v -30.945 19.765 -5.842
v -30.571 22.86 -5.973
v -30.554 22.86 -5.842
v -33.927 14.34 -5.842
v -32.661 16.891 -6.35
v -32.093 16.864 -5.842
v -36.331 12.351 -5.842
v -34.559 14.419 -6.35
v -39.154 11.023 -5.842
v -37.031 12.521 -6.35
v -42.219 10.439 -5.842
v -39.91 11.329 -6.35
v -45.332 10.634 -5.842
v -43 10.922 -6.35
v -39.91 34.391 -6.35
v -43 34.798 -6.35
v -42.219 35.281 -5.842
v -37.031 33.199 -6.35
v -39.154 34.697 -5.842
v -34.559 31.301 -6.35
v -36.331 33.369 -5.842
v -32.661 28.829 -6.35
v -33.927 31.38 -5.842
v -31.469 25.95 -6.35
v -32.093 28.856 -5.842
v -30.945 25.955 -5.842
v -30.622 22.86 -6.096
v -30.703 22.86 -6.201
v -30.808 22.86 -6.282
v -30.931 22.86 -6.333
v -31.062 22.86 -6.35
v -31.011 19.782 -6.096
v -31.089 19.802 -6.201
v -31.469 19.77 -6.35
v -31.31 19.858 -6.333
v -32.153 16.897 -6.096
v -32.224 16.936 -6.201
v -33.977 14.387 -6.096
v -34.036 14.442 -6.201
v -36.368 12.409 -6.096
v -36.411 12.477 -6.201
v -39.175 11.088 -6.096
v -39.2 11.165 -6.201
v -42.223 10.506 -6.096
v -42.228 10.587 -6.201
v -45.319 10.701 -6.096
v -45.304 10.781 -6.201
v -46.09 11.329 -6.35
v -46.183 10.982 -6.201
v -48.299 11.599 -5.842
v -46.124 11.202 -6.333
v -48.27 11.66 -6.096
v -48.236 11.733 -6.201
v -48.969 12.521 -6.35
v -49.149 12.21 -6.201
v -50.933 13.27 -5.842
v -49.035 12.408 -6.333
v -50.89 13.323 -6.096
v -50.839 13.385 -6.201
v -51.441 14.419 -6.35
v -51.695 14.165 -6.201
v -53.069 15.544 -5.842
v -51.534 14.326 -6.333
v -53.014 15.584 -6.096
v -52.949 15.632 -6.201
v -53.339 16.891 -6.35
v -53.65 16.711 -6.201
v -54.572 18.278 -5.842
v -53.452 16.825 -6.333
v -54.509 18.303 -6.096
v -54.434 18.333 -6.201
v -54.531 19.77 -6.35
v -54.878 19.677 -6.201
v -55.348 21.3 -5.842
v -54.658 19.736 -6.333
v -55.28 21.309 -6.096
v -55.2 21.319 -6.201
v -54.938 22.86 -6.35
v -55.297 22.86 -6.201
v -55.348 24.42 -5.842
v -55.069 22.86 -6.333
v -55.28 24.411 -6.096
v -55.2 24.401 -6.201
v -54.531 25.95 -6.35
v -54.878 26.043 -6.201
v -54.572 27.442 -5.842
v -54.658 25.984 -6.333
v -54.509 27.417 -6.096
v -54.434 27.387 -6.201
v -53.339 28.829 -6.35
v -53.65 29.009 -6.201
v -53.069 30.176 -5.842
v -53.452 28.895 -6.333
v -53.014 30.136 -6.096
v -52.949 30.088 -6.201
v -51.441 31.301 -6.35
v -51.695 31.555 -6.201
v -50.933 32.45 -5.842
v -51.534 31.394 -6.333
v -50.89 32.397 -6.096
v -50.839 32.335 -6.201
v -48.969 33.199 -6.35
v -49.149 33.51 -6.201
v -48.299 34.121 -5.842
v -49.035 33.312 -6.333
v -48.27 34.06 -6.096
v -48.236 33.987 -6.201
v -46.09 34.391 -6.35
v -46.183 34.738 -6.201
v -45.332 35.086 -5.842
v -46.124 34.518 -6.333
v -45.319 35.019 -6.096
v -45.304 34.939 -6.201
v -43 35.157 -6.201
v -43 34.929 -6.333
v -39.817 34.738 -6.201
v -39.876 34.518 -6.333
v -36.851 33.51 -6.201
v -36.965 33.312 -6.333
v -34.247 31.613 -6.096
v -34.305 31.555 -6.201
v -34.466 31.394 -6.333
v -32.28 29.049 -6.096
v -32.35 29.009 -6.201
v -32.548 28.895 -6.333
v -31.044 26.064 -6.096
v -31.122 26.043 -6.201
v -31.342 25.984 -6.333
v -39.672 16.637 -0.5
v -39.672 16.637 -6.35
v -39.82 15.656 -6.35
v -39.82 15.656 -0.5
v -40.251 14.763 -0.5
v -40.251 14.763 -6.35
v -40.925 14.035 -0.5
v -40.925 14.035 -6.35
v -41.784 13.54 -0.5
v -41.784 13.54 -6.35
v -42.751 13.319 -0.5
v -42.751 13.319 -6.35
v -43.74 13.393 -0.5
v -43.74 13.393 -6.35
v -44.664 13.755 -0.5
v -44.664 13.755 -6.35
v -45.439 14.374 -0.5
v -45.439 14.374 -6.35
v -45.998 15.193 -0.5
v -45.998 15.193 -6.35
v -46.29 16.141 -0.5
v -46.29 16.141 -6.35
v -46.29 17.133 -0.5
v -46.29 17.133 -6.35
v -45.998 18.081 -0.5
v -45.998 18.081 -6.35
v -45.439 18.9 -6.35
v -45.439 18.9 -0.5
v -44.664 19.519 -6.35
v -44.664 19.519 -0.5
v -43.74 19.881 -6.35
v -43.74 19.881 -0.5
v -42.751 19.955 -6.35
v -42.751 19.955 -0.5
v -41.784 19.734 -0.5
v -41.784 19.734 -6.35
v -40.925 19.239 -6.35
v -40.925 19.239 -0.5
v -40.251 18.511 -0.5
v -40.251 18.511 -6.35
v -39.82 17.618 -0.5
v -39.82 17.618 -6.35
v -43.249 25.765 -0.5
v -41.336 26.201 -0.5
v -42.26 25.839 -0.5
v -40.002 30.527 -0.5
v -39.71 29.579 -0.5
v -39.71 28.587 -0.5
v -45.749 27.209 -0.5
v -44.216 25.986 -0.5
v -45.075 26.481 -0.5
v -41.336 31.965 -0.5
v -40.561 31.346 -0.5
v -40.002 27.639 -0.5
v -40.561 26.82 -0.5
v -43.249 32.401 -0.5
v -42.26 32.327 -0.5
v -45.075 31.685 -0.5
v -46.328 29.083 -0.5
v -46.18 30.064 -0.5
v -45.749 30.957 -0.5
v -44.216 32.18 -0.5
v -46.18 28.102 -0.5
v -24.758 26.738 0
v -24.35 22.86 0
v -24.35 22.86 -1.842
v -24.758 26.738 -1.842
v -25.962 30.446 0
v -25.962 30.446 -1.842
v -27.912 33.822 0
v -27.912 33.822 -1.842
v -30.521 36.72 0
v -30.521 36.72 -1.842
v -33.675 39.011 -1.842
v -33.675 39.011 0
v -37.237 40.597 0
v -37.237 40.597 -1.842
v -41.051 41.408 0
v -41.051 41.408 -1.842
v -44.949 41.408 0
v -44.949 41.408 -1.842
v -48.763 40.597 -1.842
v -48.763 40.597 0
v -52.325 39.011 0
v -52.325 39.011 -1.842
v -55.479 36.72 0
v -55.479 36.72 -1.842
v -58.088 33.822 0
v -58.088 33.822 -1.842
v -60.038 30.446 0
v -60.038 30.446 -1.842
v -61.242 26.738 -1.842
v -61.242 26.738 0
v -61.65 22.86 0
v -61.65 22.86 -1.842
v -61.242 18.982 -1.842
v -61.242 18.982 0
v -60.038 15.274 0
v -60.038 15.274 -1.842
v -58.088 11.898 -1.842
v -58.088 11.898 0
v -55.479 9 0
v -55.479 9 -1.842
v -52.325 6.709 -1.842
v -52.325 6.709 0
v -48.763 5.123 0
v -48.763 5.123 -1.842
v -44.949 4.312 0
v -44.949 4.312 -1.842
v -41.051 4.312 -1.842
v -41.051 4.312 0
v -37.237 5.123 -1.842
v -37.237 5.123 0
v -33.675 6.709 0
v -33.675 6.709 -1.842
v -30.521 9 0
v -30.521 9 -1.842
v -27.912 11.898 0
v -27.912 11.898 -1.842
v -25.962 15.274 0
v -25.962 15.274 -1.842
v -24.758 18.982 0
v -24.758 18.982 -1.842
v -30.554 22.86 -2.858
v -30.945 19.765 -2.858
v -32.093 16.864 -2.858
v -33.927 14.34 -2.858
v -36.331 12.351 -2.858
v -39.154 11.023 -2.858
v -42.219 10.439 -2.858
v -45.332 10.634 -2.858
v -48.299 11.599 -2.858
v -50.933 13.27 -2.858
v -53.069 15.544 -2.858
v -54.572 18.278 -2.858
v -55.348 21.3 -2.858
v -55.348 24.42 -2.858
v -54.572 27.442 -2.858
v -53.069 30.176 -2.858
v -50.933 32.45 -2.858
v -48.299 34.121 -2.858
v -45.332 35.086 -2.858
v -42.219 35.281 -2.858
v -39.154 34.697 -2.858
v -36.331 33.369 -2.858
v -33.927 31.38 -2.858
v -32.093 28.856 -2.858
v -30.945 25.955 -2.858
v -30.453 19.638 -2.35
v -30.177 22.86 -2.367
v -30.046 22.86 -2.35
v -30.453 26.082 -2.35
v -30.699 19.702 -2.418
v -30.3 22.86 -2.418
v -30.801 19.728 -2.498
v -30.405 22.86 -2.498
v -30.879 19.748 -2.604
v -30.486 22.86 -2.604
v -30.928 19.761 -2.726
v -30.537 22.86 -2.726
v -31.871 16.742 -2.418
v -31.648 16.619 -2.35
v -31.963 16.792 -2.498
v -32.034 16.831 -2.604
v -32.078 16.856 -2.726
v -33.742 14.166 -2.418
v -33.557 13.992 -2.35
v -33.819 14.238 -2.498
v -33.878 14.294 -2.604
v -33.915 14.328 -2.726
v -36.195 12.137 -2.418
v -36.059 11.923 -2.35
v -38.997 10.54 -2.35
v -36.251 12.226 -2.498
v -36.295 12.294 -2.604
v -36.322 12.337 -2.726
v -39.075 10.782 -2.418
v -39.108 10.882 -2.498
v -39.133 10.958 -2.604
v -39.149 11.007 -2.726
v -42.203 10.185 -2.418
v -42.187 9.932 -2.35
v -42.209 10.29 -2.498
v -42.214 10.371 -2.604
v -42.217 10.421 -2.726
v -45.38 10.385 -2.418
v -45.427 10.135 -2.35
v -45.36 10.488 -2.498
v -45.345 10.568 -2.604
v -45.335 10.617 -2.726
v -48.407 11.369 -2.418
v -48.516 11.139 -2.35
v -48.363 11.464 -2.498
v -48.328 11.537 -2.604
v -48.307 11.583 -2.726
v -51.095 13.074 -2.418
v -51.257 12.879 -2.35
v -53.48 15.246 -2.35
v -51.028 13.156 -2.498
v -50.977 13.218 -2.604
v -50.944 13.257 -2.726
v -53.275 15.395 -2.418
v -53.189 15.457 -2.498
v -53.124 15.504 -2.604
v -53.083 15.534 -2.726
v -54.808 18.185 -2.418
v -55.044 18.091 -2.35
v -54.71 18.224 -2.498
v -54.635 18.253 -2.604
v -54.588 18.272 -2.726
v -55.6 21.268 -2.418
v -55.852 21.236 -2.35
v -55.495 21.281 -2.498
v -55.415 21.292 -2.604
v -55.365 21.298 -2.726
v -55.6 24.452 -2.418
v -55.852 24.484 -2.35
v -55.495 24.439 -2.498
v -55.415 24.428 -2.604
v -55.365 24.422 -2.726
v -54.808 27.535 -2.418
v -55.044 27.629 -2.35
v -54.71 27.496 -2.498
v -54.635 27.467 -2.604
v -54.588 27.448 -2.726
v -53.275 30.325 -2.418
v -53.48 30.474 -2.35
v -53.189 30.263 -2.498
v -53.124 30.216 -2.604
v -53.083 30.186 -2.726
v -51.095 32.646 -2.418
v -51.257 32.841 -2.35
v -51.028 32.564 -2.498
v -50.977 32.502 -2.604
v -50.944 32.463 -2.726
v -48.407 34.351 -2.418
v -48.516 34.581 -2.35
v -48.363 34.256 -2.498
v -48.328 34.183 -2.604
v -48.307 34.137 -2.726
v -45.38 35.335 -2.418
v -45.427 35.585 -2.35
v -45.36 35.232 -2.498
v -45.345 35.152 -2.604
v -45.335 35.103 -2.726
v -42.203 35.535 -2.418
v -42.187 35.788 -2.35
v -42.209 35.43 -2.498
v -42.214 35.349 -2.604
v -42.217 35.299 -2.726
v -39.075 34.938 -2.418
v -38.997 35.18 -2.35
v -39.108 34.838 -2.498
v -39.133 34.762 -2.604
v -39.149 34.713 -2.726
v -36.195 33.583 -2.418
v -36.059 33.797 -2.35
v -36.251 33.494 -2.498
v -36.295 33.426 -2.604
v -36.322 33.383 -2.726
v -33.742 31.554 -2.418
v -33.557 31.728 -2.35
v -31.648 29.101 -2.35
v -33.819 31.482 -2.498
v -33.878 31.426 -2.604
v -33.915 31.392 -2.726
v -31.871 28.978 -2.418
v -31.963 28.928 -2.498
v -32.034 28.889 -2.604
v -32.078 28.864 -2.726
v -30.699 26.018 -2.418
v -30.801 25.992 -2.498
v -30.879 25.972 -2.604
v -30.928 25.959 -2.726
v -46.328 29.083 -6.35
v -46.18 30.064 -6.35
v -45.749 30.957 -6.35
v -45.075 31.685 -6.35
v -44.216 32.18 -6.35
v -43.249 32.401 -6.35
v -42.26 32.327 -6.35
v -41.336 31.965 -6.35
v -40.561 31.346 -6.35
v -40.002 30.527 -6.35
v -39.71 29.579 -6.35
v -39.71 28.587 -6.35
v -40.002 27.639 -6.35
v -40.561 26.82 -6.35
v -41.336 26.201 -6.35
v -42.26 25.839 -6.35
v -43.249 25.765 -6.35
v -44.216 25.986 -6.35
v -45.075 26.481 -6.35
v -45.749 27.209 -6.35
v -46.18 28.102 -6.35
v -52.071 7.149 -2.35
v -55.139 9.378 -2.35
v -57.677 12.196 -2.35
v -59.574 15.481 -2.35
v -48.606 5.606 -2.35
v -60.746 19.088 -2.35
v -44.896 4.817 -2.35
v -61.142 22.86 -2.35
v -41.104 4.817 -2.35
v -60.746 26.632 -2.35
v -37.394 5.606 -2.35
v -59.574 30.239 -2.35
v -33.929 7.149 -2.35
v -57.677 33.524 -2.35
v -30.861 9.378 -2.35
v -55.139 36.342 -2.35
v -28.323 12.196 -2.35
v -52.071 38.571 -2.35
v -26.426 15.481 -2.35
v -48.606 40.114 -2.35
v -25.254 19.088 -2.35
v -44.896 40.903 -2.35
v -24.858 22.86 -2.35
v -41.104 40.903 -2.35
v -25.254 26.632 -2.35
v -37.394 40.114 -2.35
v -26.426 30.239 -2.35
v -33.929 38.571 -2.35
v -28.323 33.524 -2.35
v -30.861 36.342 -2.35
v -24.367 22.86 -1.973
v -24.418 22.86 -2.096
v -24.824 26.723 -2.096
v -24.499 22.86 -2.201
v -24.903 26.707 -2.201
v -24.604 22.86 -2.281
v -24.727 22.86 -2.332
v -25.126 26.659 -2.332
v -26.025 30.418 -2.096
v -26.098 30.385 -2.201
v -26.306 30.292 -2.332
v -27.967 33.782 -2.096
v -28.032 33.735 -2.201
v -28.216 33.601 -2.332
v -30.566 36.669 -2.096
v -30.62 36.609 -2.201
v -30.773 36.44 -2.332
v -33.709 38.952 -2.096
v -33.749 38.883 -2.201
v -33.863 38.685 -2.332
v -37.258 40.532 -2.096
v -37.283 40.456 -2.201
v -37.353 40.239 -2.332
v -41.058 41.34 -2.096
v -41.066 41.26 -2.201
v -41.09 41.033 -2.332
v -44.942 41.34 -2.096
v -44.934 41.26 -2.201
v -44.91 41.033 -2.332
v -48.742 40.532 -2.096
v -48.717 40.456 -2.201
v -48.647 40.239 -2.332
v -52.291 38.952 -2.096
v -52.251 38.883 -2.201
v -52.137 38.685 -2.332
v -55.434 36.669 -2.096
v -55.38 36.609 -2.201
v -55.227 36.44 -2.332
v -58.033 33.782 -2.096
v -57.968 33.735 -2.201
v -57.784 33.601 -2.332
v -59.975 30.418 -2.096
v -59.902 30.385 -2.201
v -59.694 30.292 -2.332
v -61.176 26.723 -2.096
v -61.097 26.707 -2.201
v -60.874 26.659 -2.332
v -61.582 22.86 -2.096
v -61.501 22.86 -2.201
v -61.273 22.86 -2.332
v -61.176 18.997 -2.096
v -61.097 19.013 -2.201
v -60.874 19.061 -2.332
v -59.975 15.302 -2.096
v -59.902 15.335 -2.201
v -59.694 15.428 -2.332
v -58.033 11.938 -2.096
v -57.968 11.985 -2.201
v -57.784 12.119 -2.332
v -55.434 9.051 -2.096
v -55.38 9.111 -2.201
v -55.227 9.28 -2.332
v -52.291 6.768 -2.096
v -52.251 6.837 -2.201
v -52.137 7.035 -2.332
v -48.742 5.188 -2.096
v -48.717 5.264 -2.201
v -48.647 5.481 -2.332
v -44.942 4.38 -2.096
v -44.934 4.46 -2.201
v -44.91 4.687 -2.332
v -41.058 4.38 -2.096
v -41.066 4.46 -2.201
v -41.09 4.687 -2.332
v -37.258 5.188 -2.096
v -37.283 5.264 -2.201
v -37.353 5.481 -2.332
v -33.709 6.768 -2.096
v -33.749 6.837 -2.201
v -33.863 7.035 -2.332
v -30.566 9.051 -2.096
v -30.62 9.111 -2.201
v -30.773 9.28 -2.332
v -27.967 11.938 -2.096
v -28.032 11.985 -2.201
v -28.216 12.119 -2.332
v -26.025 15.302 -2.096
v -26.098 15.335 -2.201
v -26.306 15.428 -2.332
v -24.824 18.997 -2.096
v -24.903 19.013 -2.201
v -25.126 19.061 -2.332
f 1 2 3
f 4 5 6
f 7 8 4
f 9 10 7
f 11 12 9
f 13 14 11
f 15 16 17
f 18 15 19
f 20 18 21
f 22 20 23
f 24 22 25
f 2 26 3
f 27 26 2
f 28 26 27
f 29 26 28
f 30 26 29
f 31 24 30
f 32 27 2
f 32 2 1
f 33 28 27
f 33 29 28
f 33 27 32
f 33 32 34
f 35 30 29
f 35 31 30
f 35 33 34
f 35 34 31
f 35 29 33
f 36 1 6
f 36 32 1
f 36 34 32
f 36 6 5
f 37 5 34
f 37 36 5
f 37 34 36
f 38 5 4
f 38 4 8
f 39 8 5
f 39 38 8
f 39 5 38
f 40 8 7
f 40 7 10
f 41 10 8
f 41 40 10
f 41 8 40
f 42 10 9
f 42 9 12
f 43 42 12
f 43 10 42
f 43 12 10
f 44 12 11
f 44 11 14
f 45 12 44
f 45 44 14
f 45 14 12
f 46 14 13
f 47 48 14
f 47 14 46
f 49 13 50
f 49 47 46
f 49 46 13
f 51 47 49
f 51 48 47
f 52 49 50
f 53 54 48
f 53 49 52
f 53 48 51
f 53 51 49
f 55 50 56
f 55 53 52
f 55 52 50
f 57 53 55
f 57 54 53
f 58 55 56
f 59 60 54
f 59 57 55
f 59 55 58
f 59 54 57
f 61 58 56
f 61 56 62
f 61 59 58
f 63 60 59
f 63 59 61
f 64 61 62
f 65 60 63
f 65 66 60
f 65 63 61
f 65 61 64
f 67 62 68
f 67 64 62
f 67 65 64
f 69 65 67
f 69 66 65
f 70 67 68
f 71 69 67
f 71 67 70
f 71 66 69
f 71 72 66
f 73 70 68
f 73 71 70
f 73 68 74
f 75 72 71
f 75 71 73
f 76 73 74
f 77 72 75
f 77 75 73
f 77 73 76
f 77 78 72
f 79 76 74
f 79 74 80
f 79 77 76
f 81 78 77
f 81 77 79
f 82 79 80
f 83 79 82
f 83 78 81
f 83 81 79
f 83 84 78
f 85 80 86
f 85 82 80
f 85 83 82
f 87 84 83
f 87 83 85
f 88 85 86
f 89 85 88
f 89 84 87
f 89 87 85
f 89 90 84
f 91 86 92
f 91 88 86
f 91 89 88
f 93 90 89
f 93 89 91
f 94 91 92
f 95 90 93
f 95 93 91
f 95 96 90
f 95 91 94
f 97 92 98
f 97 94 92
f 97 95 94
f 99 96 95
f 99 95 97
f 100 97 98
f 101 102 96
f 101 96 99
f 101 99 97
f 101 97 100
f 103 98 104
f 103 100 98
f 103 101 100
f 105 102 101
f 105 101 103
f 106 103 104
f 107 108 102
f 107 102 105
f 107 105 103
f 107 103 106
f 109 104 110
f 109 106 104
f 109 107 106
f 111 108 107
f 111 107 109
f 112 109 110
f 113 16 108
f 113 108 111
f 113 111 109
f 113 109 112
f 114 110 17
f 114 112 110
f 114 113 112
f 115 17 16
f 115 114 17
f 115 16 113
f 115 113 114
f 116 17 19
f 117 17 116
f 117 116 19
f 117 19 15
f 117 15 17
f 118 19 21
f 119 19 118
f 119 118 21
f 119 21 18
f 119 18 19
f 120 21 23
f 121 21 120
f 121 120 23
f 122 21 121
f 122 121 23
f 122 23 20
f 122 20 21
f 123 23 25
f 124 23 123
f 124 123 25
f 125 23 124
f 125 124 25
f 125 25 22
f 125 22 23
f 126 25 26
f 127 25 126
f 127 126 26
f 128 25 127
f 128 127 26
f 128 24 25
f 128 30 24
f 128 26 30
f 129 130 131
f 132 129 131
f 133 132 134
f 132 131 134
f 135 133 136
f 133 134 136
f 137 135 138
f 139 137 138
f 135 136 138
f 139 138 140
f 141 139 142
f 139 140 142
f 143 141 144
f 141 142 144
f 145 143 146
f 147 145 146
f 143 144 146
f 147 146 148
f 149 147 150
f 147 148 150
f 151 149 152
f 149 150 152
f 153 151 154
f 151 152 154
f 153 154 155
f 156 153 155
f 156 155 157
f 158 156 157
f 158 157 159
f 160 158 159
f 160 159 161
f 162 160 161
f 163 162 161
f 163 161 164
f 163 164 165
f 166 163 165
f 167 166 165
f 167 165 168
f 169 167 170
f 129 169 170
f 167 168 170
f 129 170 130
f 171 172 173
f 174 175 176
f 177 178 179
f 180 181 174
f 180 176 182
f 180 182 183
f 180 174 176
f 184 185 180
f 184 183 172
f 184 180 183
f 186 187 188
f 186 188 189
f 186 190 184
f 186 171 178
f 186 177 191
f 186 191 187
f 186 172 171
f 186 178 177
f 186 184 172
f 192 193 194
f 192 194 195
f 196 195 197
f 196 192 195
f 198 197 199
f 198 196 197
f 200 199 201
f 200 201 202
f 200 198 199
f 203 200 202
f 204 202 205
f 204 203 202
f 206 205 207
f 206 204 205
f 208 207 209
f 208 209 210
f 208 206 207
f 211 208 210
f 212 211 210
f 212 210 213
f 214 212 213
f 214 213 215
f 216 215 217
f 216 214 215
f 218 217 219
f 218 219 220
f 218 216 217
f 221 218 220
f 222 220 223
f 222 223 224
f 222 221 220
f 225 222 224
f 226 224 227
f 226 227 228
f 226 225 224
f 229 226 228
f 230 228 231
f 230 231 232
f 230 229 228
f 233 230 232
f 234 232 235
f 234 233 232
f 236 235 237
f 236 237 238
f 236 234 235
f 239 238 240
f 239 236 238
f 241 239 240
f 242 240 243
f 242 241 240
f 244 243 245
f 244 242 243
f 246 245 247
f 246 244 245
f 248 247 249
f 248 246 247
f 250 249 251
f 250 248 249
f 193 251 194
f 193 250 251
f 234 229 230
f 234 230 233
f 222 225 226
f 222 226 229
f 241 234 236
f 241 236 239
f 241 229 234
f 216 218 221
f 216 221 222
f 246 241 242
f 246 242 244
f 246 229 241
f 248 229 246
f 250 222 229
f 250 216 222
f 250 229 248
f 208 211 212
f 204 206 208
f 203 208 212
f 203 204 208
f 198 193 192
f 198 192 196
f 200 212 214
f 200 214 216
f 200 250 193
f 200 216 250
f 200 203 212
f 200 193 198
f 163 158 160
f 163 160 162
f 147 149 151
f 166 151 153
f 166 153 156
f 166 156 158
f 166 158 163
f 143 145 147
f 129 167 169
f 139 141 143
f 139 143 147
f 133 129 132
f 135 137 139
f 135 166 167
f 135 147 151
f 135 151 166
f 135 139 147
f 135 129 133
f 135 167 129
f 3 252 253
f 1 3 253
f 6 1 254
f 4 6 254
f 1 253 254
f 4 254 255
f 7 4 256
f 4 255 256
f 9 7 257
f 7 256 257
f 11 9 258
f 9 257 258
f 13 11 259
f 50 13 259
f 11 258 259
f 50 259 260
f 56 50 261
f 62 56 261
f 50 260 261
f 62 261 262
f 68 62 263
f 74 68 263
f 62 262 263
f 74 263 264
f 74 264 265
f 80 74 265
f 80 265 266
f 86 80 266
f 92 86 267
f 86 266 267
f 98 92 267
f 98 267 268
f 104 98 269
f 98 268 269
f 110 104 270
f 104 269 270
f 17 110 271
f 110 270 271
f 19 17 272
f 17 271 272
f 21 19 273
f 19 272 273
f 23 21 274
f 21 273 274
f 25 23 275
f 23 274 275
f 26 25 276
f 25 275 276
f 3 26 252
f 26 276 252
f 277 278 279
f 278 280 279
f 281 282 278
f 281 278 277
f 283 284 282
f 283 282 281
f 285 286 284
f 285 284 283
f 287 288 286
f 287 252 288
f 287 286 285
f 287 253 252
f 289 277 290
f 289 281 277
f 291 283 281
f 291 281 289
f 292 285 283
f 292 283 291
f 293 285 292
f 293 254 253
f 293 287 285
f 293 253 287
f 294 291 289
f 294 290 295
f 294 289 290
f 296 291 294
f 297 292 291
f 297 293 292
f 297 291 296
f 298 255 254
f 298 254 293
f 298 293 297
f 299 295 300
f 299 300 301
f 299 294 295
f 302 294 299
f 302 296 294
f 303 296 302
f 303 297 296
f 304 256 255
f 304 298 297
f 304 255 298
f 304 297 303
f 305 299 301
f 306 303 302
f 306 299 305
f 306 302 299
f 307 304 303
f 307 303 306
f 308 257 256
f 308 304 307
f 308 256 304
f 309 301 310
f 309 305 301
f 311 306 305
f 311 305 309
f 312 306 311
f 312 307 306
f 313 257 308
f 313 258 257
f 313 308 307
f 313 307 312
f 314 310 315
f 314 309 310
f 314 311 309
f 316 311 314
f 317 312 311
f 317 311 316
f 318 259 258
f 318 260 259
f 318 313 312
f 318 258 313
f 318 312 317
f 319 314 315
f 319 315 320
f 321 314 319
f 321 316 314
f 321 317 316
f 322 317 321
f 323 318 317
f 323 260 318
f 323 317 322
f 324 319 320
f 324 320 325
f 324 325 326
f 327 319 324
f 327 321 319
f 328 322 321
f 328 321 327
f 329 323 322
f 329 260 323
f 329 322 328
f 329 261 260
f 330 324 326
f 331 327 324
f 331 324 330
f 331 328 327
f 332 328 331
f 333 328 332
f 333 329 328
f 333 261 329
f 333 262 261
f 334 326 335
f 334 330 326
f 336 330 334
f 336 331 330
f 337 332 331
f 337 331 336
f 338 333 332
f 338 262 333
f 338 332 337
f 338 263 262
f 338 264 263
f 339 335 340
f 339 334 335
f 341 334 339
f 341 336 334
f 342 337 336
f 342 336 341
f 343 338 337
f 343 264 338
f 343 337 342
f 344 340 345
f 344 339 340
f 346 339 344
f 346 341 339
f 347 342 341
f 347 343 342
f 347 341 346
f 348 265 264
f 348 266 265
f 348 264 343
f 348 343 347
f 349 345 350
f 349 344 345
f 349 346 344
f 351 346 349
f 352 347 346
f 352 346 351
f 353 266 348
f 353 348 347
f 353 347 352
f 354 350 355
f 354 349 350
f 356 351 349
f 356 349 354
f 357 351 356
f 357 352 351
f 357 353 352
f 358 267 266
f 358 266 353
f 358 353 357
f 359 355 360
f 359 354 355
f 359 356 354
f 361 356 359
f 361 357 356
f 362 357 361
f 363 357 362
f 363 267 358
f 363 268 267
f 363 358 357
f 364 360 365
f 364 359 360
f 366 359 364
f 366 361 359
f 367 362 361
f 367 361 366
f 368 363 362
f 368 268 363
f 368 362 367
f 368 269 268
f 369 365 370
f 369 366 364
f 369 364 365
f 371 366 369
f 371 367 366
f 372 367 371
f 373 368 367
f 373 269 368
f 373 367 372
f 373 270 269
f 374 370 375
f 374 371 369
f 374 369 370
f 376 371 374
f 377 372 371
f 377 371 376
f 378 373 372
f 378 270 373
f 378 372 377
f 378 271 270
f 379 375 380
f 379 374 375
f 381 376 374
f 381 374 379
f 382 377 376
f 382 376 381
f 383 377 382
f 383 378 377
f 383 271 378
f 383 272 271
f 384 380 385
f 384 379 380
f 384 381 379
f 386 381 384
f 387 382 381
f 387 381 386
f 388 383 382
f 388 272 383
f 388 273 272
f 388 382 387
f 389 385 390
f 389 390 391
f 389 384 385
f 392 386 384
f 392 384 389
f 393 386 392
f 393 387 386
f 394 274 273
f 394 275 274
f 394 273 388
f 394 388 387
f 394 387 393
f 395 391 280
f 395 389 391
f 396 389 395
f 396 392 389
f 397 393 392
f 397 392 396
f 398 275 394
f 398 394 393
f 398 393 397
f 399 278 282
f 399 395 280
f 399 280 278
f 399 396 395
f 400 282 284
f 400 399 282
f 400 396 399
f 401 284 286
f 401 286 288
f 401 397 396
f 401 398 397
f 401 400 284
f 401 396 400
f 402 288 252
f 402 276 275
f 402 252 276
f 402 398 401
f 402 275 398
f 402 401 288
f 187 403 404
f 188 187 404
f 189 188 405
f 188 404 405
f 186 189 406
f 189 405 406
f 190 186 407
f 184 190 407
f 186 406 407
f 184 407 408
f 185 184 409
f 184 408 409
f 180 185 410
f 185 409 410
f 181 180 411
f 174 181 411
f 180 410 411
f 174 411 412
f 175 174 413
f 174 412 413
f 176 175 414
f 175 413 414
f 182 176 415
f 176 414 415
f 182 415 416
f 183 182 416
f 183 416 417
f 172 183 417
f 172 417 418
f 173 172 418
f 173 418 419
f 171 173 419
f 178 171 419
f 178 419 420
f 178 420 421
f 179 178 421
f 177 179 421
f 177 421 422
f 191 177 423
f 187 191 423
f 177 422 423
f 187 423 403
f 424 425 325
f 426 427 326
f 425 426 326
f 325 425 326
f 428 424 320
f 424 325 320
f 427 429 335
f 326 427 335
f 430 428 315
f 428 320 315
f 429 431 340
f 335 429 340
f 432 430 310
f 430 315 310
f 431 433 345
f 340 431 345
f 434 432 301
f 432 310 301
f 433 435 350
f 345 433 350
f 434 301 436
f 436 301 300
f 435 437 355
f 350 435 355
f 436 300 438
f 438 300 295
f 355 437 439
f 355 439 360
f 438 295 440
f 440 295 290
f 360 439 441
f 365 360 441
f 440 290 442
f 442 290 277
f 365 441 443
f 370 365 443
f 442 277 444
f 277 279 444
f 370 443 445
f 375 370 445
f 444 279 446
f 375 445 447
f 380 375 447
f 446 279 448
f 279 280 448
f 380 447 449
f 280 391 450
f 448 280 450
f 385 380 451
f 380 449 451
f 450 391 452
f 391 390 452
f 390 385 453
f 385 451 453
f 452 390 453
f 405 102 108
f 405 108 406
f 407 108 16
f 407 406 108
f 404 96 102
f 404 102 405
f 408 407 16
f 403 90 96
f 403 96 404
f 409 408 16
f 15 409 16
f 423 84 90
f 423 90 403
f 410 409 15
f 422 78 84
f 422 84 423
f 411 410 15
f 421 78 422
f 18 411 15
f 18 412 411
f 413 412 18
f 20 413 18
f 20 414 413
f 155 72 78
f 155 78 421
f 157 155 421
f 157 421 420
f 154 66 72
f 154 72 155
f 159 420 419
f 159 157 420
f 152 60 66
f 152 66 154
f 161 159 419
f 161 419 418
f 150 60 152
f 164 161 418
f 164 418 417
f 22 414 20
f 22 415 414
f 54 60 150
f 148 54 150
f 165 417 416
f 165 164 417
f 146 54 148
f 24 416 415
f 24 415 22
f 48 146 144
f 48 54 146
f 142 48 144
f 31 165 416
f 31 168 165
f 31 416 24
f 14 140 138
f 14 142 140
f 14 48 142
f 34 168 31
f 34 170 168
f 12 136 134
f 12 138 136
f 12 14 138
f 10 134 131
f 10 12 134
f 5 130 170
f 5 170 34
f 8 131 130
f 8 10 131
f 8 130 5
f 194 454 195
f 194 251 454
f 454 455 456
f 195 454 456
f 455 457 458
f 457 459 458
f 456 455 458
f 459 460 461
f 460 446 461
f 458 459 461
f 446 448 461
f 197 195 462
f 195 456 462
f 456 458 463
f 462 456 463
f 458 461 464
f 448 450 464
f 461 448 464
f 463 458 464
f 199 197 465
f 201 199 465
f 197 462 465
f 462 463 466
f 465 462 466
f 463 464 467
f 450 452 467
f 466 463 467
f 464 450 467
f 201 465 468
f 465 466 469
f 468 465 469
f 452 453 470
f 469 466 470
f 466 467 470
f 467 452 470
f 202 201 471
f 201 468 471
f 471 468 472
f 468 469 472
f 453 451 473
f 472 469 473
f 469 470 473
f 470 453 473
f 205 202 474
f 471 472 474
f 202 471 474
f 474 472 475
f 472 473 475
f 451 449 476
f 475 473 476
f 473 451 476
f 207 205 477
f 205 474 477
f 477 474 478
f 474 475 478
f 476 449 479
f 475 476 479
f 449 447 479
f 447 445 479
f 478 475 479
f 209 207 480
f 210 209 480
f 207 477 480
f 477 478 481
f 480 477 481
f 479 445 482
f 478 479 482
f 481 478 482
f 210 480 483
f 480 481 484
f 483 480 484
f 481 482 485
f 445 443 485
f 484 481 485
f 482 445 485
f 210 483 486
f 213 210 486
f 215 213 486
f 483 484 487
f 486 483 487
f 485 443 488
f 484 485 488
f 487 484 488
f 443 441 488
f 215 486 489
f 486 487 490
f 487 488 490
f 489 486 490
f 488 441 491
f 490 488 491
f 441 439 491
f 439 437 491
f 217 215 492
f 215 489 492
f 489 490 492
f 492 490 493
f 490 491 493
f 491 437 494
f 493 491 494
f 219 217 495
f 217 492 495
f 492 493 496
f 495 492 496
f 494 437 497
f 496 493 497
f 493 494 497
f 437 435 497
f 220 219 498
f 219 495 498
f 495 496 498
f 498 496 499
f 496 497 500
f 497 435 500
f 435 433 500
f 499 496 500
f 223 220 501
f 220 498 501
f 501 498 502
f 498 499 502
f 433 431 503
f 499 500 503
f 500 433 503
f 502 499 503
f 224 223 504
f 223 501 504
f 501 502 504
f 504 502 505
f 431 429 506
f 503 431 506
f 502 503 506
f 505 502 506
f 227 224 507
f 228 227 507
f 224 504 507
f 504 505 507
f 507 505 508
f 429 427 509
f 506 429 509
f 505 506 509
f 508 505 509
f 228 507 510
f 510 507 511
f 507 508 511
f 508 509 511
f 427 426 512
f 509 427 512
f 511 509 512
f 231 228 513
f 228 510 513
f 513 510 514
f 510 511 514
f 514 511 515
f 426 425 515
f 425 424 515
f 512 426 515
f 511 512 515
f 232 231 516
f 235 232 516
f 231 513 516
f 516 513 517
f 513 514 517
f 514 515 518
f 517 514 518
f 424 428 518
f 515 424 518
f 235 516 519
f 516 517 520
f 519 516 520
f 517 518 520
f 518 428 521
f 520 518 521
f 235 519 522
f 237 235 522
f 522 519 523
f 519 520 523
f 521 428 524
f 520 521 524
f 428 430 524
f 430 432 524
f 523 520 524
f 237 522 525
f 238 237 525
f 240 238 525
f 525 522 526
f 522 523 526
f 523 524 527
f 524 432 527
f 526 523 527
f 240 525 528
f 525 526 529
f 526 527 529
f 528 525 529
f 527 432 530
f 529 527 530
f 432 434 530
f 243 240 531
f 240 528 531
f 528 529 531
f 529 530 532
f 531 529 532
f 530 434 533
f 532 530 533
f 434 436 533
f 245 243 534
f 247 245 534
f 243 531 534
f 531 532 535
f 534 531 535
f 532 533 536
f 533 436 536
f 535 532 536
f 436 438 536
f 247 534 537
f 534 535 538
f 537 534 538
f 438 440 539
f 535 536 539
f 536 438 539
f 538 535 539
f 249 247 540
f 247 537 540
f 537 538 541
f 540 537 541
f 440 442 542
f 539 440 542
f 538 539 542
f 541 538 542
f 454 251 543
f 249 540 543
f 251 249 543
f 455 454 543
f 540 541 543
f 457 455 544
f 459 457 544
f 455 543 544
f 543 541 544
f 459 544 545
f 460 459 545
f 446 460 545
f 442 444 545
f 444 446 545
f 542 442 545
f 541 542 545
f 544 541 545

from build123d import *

# Parameters (mm, degrees)
SKETCH1_R           = 18.65
BOSS_EXTRUDE1_DEPTH = 2.3495
SKETCH4_R           = 12.446
BOSS_EXTRUDE2_DEPTH = 4.0005
SKETCH5_R           = 3.3275
CUT_EXTRUDE1_DEPTH  = 5.85
FILLET1_R           = 0.508


with BuildPart() as part:
    # Sketch1 → Boss-Extrude1 (new body)
    with BuildSketch(Plane.XY):
        with Locations((-43, 22.86)):
            Circle(SKETCH1_R)
    extrude(amount=-BOSS_EXTRUDE1_DEPTH)

    # Sketch4 → Boss-Extrude2 (add)
    with BuildSketch(Plane(origin=(0, 0, -2.3495), x_dir=(-1, 0, 0), z_dir=(0, 0, -1))):
        with Locations(Location((43, 22.86, 0), (0, 0, 180))):
            Circle(SKETCH4_R)
    extrude(amount=BOSS_EXTRUDE2_DEPTH)

    # Sketch5 → Cut-Extrude1 (cut)
    with BuildSketch(Plane(origin=(0, 0, -6.35), x_dir=(-1, 0, 0), z_dir=(0, 0, -1))):
        with Locations((43, 29.083)):
            Circle(SKETCH5_R)
        with Locations(Location((43, 16.637, 0), (0, 0, 180))):
            Circle(SKETCH5_R)
    extrude(amount=-CUT_EXTRUDE1_DEPTH, mode=Mode.SUBTRACT)

    # Fillet1
    fillet1_edges = [part.edges().sort_by_distance(p)[0] for p in [
        (-61.65, 22.86, -2.3495),
        (-55.446, 22.86, -2.3495),
        (-55.446, 22.86, -6.35),
    ]]
    fillet(fillet1_edges, radius=FILLET1_R)


solid = part.part
